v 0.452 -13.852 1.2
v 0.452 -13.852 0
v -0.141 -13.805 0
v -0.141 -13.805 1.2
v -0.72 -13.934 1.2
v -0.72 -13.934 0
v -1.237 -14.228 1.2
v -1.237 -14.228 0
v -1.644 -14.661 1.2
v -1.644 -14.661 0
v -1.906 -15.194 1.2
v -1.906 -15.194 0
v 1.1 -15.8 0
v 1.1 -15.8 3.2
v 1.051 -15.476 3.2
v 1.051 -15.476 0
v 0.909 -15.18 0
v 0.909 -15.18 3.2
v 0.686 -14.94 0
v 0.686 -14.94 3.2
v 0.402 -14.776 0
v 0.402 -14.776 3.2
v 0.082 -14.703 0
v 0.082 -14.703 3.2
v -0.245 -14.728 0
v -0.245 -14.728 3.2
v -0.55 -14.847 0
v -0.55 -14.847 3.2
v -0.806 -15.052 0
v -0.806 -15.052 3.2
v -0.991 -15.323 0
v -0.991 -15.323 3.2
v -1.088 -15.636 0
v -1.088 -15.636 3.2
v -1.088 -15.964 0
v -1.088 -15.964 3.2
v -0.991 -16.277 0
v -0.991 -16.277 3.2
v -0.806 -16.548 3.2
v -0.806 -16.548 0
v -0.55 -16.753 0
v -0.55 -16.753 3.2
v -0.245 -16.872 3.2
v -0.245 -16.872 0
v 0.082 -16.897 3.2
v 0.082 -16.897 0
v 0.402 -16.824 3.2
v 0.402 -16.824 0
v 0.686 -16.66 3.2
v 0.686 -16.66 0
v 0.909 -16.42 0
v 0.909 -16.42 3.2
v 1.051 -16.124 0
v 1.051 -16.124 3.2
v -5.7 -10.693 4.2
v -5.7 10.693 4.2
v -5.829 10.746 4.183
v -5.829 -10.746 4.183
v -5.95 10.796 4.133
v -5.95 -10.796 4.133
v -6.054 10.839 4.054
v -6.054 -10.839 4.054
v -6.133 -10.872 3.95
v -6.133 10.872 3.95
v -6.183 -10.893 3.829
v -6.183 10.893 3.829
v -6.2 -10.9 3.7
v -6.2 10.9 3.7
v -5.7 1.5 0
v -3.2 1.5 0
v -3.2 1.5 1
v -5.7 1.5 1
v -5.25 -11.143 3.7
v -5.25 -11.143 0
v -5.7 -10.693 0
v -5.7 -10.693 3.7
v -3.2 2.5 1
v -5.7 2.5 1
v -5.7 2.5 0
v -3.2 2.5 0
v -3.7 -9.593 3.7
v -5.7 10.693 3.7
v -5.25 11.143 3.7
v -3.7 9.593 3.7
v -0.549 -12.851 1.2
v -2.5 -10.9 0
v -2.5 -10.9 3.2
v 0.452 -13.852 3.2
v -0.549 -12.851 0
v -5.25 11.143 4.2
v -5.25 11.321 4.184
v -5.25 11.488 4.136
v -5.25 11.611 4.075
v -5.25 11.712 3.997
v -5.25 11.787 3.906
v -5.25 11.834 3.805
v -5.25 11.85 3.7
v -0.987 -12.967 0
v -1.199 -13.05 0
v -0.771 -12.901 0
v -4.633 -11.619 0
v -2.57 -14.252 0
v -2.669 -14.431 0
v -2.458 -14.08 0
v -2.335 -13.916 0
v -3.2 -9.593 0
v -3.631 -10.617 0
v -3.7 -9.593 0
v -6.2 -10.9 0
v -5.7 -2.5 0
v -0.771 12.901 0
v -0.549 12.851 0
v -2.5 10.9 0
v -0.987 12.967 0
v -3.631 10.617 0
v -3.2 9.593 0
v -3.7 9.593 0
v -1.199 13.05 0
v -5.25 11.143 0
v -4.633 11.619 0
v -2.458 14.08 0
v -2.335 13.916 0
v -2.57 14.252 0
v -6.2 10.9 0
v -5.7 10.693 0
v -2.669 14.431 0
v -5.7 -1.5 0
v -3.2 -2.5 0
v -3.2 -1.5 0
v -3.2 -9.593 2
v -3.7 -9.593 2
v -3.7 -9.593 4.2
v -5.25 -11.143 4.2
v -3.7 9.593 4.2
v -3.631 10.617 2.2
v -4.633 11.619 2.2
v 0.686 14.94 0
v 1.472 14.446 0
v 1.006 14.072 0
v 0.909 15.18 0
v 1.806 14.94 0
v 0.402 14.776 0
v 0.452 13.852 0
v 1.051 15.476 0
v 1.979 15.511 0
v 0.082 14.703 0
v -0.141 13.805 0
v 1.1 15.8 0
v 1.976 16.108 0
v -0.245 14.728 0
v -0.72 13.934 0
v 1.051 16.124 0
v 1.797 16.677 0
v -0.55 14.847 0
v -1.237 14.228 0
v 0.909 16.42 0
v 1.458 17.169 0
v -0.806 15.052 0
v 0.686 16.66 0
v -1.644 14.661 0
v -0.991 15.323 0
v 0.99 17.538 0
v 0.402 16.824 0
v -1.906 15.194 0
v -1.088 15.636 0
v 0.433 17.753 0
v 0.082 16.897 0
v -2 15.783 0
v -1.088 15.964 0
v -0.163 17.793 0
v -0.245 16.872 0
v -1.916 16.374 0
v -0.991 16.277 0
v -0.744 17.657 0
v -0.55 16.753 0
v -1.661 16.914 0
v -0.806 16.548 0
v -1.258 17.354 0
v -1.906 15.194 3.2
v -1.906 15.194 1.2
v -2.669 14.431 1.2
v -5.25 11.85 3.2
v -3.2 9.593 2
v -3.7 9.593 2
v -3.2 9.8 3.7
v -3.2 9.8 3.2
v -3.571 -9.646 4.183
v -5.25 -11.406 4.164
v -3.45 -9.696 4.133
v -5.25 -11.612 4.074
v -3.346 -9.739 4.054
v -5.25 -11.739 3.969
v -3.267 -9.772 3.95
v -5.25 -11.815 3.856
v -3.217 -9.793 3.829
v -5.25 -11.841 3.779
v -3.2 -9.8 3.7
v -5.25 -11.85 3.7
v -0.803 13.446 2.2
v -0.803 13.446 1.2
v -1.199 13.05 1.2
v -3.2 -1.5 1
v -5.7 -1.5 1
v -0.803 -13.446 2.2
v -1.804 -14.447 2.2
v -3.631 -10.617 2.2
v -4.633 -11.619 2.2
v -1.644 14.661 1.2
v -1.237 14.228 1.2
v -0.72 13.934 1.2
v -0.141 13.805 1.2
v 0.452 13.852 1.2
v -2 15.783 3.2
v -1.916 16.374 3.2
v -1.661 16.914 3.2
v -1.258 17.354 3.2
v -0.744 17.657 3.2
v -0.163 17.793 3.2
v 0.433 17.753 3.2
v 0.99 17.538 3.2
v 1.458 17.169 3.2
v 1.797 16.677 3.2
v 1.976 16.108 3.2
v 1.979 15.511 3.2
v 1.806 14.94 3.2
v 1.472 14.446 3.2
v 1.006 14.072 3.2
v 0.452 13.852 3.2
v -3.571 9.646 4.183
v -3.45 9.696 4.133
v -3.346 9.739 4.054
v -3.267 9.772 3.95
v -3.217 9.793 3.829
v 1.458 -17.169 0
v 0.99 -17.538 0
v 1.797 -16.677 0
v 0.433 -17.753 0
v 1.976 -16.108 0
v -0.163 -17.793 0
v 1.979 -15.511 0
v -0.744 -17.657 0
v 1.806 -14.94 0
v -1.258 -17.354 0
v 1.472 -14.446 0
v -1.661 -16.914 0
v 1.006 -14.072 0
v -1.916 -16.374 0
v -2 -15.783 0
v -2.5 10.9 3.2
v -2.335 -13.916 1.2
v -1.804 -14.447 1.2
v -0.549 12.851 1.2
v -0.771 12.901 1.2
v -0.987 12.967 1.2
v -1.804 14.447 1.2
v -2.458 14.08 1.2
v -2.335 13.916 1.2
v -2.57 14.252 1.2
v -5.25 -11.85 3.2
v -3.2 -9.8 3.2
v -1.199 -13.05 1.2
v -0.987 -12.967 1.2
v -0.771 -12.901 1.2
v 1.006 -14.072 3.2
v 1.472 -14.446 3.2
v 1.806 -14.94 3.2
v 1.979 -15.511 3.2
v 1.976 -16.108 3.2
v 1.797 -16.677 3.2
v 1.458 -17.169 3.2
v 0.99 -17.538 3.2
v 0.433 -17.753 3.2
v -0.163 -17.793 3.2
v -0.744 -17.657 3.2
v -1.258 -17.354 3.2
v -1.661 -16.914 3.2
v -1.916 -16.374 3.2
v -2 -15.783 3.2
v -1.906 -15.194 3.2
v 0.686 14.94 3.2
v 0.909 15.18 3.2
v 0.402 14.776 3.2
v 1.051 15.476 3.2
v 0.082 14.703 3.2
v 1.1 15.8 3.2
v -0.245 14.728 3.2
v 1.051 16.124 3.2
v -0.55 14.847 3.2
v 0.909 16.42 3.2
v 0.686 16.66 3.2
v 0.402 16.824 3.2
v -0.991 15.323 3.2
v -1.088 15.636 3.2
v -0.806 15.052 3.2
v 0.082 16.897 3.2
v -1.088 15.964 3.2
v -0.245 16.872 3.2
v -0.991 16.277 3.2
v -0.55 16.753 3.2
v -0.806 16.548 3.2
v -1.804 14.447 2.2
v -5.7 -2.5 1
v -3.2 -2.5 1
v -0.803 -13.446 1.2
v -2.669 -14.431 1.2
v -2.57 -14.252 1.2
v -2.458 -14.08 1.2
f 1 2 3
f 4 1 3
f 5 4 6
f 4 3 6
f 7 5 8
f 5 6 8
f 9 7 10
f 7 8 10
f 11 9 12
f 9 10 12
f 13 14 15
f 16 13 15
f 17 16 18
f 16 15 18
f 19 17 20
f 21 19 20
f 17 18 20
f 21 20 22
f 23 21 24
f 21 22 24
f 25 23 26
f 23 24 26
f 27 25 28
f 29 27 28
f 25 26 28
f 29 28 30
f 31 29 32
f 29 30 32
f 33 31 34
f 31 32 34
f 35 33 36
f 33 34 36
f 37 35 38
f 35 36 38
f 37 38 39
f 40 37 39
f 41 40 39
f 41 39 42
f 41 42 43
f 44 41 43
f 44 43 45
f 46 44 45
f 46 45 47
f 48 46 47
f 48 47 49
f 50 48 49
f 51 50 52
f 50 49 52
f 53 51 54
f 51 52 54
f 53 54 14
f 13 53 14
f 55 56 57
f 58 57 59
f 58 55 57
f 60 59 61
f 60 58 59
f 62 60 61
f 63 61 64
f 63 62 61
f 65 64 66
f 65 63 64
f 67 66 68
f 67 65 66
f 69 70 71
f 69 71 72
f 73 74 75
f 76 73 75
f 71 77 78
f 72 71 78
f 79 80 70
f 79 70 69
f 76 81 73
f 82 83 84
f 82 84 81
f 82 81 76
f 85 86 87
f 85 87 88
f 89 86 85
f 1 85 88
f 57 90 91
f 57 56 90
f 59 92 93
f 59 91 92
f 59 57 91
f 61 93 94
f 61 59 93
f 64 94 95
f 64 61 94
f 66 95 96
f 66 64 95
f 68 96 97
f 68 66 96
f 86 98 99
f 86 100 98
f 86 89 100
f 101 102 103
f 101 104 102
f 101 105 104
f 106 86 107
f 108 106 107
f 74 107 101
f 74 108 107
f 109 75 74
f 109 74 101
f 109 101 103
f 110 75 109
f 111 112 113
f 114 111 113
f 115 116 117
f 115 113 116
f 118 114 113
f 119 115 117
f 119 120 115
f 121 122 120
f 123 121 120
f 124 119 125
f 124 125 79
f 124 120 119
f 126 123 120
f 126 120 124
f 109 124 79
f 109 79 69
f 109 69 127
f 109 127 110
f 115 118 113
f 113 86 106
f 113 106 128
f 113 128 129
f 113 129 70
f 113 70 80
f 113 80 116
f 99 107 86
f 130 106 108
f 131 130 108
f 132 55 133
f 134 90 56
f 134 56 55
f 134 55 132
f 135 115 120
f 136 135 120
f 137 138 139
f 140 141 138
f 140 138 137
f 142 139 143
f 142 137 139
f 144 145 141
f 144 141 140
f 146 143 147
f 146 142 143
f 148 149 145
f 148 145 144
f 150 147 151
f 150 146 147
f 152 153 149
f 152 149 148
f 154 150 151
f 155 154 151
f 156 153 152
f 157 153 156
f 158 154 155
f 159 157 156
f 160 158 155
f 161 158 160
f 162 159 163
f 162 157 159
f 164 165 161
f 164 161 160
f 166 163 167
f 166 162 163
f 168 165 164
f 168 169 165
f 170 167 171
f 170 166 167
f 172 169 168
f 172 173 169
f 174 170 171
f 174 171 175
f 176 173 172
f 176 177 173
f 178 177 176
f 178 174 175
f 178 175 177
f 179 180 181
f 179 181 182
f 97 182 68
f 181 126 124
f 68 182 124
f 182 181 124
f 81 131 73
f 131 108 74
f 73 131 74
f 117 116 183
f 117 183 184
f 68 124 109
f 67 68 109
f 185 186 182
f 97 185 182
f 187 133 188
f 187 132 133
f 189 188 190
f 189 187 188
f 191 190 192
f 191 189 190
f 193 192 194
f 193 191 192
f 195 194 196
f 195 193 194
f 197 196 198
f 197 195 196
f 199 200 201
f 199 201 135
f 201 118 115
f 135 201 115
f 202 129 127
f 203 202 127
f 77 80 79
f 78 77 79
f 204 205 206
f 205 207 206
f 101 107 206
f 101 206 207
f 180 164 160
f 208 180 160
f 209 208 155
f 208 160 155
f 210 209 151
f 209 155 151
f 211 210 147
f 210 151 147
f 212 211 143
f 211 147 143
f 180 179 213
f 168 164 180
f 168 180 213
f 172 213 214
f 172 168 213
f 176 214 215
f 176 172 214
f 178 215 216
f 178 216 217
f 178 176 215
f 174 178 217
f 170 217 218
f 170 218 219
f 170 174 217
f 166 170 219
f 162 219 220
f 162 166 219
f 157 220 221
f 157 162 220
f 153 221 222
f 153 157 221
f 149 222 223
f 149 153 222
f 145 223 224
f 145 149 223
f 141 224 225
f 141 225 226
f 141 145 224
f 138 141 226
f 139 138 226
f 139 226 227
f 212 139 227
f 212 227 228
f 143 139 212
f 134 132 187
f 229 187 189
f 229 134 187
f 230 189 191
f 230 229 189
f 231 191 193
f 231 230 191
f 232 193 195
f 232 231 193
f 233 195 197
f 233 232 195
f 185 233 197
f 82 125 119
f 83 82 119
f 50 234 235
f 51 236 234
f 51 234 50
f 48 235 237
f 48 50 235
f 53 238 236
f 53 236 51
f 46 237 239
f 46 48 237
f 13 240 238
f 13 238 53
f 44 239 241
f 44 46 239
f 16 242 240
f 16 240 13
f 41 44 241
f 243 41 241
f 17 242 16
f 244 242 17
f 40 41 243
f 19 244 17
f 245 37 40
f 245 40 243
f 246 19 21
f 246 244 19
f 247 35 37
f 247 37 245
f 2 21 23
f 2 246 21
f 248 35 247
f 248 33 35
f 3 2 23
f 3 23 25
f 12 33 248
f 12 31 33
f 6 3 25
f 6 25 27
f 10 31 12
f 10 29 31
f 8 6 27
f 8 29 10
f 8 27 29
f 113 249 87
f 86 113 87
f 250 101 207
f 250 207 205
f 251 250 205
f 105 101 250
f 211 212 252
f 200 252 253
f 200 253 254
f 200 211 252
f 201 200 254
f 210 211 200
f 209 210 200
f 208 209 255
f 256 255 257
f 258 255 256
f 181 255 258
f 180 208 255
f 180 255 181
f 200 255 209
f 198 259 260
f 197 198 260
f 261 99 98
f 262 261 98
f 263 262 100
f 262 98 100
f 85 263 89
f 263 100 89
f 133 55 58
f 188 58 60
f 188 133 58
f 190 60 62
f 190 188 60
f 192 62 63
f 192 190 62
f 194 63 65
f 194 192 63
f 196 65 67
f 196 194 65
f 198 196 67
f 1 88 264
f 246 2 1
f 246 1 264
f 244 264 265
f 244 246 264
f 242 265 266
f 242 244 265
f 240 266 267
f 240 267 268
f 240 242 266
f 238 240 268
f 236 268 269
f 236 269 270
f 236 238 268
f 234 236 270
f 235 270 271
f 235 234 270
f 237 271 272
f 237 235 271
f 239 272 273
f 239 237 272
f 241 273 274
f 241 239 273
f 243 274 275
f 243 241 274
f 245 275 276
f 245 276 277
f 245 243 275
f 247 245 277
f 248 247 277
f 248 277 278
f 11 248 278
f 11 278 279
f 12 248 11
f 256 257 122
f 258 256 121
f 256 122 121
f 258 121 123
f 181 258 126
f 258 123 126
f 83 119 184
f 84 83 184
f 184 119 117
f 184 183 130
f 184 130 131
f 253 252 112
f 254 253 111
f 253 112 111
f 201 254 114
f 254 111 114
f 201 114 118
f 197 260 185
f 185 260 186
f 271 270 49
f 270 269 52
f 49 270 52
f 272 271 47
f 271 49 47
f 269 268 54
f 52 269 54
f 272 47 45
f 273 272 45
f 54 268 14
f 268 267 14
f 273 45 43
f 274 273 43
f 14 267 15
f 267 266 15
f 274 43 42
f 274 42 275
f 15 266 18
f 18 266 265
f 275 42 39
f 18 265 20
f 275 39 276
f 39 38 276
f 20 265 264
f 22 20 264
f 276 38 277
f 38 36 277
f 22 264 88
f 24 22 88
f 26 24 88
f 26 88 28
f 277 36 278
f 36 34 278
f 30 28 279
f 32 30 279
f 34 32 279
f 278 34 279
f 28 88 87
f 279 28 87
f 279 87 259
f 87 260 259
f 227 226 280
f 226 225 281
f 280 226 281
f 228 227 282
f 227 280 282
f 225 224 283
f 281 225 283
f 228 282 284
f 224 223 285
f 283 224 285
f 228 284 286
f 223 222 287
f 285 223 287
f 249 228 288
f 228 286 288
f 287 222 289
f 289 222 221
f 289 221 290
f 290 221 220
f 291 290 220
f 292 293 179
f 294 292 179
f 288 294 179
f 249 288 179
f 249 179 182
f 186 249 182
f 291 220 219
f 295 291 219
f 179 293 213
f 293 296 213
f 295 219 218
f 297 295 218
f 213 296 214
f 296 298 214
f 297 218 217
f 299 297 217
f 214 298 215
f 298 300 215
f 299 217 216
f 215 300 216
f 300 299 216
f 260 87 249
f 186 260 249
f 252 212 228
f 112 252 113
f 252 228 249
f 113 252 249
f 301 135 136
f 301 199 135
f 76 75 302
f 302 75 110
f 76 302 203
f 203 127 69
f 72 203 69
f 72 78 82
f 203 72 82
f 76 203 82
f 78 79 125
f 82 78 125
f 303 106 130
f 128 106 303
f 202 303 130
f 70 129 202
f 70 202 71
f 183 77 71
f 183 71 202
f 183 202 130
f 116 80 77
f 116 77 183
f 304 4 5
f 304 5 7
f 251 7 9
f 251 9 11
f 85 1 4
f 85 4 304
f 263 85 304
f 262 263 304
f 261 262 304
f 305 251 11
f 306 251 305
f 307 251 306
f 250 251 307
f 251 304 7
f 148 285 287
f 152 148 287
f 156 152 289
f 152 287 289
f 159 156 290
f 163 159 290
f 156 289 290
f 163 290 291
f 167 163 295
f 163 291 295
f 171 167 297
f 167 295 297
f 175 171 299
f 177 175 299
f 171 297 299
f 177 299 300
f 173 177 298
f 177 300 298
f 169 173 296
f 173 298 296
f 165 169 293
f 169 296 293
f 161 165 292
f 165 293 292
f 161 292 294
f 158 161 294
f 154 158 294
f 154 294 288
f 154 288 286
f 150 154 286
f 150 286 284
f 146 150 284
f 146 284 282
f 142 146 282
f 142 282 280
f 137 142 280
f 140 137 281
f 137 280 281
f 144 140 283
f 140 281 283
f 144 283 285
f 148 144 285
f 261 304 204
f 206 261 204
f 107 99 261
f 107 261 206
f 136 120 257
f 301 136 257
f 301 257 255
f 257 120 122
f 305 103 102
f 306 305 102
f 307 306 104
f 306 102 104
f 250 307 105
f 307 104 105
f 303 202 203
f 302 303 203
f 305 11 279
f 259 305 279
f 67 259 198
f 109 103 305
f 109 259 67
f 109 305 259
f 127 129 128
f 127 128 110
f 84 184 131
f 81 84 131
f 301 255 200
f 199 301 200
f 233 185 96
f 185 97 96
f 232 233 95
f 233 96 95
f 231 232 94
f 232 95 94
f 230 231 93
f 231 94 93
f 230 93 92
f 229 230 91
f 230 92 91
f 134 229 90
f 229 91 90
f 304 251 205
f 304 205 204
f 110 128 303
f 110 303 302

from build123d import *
from build123d.topology import SkipClean

# Parameters (mm, degrees)
EXTRUDE_1_DEPTH      = 3.2
SKETCH_2_R           = 1.1
CUT_EXTRUDE_1_DEPTH  = 3.2
EXTRUDE_2_DEPTH      = 1
FILLET_2_R           = 0.5
CUT_EXTRUDE_10_DEPTH = 3.7
SKETCH_9_W           = 0.5
SKETCH_9_H           = 19.185786438
CUT_EXTRUDE_11_DEPTH = 2
CUT_EXTRUDE_12_DEPTH = 3.2
CUT_EXTRUDE_13_DEPTH = 2.2
CUT_EXTRUDE_14_DEPTH = 1.2
SKETCH_15_W          = 2.5
SKETCH_15_H          = 1
EXTRUDE_3_DEPTH      = 1


with BuildPart() as part:
    # 草图1 → 凸台-拉伸1 (new body)
    with BuildSketch(Plane.XY):
        with BuildLine():
            Line((-6.2, 0), (-6.2, 10.9))
            Line((-6.2, 10.9), (-1.905985669, 15.194014331))
            ThreePointArc((-1.905985669, 15.194014331), (0.989561851, 17.538035484), (0.451668523, 13.851668523))
            Line((0.451668523, 13.851668523), (-2, 11.4))
            Line((-2, 11.4), (-2, 0))
            Line((-2, 0), (-2, -11.4))
            Line((-2, -11.4), (0.451668523, -13.851668523))
            ThreePointArc((0.451668523, -13.851668523), (0.989561851, -17.538035484), (-1.905985669, -15.194014331))
            Line((-1.905985669, -15.194014331), (-6.2, -10.9))
            Line((-6.2, -10.9), (-6.2, 0))
        make_face()
    extrude(amount=EXTRUDE_1_DEPTH)

    # 草图2 → 切除-拉伸1 (cut)
    with BuildSketch(Plane.XY.offset(3.2)):
        with Locations((0, 15.8)):
            Circle(SKETCH_2_R)
        with Locations((0, -15.8)):
            Circle(SKETCH_2_R)
    extrude(amount=-CUT_EXTRUDE_1_DEPTH, mode=Mode.SUBTRACT)

    # 草图3 → 凸台-拉伸2 (add)
    with BuildSketch(Plane.XY.offset(3.2)):
        Polygon((-3.2, 0), (-3.2, 9.8), (-5.25, 11.85), (-6.2, 10.9), (-6.2, -10.9), (-5.25, -11.85), (-3.2, -9.8), align=None)
    extrude(amount=EXTRUDE_2_DEPTH)

    # 圆角2
    fillet_2_edges = [part.edges().sort_by_distance(p)[0] for p in [
        (-4.225, -10.825, 4.2),
        (-5.725, -11.375, 4.2),
        (-3.2, 0, 4.2),
        (-4.225, 10.825, 4.2),
        (-5.725, 11.375, 4.2),
        (-6.2, 0, 4.2),
    ]]
    fillet(fillet_2_edges, radius=FILLET_2_R)

    # 草图7 → 切除-拉伸10 (cut)
    with BuildSketch(Plane.XY):
        Polygon((-5.25, 11.142893219), (-3.7, 9.592893219), (-3.7, -9.592893219), (-5.25, -11.142893219), (-5.7, -10.692893219), (-5.7, 10.692893219), align=None)
    extrude(amount=CUT_EXTRUDE_10_DEPTH, mode=Mode.SUBTRACT)

    # 草图9 → 切除-拉伸11 (cut)
    with BuildSketch(Plane(origin=(0, 0, 0), x_dir=(-1, 0, 0), z_dir=(0, 0, -1))):
        with Locations((3.45, 0)):
            Rectangle(SKETCH_9_W, SKETCH_9_H)
    extrude(amount=-CUT_EXTRUDE_11_DEPTH, mode=Mode.SUBTRACT)

    # 草图10 → 切除-拉伸12 (cut)
    with BuildSketch(Plane.XY.offset(3.2)):
        Polygon((-2.5, 10.9), (-2.5, -10.9), (-2, -11.4), (-2, 11.4), align=None)
    extrude(amount=-CUT_EXTRUDE_12_DEPTH, mode=Mode.SUBTRACT)

    # 草图12 → 切除-拉伸13 (cut)
    with BuildSketch(Plane(origin=(0, 0, 0), x_dir=(-1, 0, 0), z_dir=(0, 0, -1))):
        Polygon((3.63137085, 10.617157288), (4.632842712, 11.61862915), (1.804415588, 14.447056275), (0.802943725, 13.445584413), align=None)
        Polygon((1.804415588, -14.447056275), (0.802943725, -13.445584413), (3.63137085, -10.617157288), (4.632842712, -11.61862915), align=None)
    extrude(amount=-CUT_EXTRUDE_13_DEPTH, mode=Mode.SUBTRACT)

    # 草图14 → 切除-拉伸14 (cut)
    with SkipClean():  # the faces are left unmerged after this step: merging them gives an invalid solid
        with BuildSketch(Plane(origin=(0, 0, 0), x_dir=(-1, 0, 0), z_dir=(0, 0, -1))):
            with BuildLine():
                Line((1.905985669, -15.194014331), (2.669282051, -14.430717949))
                ThreePointArc((2.669282051, -14.430717949), (1.792734548, -13.394568055), (0.549285568, -12.850714432))
                Line((0.549285568, -12.850714432), (-0.451668523, -13.851668523))
                ThreePointArc((-0.451668523, -13.851668523), (0.989561851, -14.061964516), (1.905985669, -15.194014331))
            make_face()
            with BuildLine():
                Line((-0.451668523, 13.851668523), (0.549285568, 12.850714432))
                ThreePointArc((0.549285568, 12.850714432), (1.792734548, 13.394568055), (2.669282051, 14.430717949))
                Line((2.669282051, 14.430717949), (1.905985669, 15.194014331))
                ThreePointArc((1.905985669, 15.194014331), (0.989561851, 14.061964516), (-0.451668523, 13.851668523))
            make_face()
        extrude(amount=-CUT_EXTRUDE_14_DEPTH, mode=Mode.SUBTRACT)

    # 草图15 → 凸台-拉伸3 (add)
    with SkipClean():  # the faces are left unmerged after this step: merging them gives an invalid solid
        with BuildSketch(Plane(origin=(0, 0, 0), x_dir=(-1, 0, 0), z_dir=(0, 0, -1))):
            with Locations((4.45, 2)):
                Rectangle(SKETCH_15_W, SKETCH_15_H)
            with Locations((4.45, -2)):
                Rectangle(SKETCH_15_W, SKETCH_15_H)
        extrude(amount=-EXTRUDE_3_DEPTH)


solid = part.part
